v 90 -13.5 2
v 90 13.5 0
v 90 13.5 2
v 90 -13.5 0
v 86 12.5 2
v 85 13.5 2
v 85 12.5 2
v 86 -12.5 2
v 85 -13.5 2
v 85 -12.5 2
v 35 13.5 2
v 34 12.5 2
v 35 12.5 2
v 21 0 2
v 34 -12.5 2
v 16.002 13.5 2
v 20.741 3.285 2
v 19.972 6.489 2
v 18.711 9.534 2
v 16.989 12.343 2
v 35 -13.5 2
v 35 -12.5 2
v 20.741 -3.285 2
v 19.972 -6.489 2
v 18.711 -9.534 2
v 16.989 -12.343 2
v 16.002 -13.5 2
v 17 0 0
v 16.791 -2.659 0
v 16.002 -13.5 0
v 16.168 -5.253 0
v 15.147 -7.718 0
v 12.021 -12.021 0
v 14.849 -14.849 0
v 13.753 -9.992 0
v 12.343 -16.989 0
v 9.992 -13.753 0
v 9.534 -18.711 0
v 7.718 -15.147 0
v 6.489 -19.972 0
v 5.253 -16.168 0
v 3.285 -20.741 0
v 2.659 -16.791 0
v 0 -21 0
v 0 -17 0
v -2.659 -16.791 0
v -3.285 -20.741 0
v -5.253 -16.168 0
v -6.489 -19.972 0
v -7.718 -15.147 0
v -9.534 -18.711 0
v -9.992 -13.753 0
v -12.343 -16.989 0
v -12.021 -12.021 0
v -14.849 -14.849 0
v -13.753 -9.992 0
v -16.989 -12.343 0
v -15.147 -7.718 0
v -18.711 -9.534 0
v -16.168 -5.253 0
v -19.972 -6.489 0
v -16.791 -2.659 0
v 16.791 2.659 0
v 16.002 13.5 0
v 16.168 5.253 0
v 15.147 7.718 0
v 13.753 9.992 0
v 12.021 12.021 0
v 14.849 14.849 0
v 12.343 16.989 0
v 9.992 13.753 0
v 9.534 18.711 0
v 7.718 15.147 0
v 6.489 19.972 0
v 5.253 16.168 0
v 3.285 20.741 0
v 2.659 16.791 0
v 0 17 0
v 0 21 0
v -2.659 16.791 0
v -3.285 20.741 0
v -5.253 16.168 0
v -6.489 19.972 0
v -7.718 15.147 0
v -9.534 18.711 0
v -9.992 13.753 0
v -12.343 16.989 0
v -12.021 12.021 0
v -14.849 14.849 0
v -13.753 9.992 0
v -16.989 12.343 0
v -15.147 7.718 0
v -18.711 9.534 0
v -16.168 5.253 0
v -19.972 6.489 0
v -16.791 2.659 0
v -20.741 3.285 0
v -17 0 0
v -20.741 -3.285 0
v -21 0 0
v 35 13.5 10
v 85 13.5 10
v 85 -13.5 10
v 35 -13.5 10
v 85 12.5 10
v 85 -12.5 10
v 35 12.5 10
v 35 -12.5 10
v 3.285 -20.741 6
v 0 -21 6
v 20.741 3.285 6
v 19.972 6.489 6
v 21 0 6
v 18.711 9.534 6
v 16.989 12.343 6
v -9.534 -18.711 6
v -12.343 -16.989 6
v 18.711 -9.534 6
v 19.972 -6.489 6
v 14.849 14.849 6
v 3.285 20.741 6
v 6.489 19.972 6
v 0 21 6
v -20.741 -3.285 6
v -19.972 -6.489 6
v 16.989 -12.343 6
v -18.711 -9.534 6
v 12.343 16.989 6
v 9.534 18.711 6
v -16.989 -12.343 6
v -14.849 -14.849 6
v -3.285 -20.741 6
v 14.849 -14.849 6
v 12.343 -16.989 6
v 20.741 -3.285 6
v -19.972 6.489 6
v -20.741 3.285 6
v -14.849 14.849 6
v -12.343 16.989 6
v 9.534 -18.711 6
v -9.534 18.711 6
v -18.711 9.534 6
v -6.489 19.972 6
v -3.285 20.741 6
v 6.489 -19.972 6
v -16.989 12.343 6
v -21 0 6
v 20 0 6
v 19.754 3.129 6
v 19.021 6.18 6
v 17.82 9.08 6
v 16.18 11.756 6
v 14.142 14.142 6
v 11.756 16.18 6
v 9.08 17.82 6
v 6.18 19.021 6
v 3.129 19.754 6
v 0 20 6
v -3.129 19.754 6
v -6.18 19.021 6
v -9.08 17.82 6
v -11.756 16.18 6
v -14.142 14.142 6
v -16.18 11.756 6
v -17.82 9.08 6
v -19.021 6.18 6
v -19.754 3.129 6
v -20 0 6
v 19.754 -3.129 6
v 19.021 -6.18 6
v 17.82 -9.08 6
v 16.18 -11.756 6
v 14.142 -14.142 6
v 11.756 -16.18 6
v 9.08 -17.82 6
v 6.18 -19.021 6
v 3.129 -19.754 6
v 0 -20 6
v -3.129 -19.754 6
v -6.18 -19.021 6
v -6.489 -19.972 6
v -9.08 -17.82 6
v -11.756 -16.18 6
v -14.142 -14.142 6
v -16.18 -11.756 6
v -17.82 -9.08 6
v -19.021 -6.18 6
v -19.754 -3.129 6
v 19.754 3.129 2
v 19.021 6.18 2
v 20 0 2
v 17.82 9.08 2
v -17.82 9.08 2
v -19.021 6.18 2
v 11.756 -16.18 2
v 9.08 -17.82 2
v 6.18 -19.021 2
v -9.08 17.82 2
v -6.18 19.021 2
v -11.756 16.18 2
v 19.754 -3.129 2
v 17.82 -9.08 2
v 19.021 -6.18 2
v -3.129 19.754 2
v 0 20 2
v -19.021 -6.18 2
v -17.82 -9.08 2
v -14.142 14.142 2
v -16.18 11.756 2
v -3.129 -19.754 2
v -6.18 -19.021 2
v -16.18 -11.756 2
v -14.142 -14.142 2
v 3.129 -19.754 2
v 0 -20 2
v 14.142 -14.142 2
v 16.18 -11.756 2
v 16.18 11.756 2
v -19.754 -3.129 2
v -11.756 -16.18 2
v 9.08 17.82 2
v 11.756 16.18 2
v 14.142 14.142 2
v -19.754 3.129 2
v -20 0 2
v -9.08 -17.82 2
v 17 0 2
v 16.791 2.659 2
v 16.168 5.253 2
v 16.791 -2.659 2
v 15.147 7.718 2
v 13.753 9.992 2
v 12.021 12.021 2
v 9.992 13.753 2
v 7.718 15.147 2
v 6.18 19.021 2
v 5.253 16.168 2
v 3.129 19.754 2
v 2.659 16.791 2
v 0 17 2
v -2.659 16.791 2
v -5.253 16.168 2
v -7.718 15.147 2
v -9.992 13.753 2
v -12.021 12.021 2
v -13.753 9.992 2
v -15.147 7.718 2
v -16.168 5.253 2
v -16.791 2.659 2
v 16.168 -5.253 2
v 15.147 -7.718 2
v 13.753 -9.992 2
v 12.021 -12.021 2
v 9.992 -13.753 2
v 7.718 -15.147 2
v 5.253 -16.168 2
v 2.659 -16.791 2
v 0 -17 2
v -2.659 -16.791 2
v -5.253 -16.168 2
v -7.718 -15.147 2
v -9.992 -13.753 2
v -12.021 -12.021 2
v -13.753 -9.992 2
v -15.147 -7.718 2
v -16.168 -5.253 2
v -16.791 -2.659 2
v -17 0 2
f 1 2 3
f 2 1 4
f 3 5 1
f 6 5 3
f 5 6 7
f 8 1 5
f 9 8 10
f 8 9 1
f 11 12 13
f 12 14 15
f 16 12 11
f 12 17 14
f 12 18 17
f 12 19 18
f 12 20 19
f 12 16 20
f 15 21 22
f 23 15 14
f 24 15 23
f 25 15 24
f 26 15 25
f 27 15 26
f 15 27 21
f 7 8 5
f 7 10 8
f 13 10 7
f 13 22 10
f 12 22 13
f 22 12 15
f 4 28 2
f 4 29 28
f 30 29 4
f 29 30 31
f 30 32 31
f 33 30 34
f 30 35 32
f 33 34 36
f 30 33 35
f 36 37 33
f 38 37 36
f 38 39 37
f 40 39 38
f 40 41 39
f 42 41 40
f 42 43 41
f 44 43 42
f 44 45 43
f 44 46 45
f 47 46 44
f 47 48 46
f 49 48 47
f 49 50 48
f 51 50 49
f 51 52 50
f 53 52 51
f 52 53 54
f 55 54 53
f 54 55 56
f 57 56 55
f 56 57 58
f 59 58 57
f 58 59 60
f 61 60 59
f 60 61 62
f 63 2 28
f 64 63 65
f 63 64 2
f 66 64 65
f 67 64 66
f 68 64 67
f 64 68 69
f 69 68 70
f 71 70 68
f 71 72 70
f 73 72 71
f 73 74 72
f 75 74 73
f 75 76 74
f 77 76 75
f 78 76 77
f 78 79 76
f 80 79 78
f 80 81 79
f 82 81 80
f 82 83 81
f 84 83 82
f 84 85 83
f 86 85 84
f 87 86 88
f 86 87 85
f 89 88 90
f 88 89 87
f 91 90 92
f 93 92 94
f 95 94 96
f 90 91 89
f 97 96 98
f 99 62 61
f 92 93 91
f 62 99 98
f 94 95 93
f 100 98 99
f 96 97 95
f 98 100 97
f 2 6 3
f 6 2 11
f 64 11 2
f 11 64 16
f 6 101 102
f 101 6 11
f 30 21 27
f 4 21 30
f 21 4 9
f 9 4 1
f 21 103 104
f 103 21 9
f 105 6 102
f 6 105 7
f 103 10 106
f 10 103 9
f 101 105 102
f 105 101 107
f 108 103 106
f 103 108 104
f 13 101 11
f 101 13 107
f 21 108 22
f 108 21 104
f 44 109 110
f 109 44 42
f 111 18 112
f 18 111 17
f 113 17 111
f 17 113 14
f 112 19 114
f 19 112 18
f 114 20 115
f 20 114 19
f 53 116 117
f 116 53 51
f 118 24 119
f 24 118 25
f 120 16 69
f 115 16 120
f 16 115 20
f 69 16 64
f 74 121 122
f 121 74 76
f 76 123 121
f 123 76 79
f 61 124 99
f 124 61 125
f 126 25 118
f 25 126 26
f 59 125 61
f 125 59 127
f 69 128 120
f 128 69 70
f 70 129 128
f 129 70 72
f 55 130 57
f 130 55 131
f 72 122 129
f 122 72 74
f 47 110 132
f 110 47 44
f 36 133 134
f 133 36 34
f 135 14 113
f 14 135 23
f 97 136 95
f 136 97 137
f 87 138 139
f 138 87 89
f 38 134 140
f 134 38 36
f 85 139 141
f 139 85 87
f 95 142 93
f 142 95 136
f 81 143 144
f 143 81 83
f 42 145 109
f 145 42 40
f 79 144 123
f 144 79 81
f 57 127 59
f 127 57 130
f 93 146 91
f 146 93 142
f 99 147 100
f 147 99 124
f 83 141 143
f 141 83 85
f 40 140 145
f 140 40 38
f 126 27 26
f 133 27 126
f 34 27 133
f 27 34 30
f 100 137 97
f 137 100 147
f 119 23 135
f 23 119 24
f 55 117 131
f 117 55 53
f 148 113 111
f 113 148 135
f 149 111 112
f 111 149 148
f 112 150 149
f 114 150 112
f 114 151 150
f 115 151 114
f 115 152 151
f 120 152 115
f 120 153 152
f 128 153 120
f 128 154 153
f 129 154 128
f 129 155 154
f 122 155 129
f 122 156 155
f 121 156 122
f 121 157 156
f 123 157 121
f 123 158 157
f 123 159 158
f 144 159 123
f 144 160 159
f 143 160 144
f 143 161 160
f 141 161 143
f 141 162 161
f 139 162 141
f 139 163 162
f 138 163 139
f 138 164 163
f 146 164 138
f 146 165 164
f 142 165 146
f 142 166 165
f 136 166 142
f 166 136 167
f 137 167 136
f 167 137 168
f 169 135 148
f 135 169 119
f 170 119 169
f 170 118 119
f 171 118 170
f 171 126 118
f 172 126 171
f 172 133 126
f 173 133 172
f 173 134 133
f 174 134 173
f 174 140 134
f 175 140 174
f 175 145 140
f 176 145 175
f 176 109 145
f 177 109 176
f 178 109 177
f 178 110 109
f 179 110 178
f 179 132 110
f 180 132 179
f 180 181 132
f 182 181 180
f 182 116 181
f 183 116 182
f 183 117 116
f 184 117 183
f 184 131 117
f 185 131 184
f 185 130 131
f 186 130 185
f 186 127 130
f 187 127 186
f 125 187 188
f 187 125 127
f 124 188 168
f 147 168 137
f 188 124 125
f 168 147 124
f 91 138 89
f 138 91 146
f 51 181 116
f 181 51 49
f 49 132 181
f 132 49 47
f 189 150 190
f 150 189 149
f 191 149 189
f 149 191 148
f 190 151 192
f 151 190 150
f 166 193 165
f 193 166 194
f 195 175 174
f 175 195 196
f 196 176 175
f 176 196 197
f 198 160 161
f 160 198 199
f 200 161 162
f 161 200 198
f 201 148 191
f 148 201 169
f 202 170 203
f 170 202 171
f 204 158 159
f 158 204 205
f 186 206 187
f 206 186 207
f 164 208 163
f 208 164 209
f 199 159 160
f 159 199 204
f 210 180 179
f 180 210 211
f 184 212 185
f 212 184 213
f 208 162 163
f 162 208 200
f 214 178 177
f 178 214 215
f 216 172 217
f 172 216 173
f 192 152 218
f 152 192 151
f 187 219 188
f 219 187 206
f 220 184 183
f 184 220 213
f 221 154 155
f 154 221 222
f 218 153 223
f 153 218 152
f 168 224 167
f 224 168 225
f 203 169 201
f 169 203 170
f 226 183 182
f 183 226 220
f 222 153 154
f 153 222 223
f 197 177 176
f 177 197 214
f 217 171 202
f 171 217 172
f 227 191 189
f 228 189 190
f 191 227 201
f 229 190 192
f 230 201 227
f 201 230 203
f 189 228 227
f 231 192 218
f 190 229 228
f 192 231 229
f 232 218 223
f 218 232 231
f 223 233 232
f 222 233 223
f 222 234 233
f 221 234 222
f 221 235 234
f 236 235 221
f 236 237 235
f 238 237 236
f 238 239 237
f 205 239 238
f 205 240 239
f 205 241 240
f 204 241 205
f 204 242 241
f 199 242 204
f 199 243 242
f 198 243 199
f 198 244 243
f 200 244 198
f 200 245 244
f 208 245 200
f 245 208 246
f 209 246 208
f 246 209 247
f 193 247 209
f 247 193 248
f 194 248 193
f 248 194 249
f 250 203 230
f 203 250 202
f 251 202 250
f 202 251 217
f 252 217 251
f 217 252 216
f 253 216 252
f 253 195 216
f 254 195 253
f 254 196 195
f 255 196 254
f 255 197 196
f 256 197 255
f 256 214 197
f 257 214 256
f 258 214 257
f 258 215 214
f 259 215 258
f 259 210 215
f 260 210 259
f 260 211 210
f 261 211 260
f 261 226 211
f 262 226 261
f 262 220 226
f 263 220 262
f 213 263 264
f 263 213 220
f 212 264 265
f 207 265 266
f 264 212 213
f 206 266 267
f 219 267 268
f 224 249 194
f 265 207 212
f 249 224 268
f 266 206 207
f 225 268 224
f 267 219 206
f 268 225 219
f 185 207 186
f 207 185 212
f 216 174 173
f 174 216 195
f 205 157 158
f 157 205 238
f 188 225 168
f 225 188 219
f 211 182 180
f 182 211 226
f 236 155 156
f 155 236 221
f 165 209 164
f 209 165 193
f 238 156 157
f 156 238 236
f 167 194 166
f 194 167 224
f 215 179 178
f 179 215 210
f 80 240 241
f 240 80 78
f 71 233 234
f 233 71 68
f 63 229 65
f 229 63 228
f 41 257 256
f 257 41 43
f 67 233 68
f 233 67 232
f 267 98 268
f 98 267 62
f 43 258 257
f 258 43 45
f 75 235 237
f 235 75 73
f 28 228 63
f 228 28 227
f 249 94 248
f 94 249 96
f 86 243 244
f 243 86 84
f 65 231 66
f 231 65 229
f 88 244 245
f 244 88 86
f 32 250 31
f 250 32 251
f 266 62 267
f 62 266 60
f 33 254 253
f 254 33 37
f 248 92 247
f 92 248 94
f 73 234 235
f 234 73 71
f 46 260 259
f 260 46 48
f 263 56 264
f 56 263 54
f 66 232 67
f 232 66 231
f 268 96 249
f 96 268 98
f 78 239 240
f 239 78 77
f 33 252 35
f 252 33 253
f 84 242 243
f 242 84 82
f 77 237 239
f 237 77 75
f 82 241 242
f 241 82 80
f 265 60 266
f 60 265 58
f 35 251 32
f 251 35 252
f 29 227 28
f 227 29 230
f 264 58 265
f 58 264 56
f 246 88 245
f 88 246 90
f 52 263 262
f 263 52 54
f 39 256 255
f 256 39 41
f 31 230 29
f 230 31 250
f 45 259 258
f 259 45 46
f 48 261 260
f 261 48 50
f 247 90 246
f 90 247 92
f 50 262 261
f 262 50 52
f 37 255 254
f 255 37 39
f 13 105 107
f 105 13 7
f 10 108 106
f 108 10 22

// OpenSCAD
//MR WHOOSH FLAMETHROWER MKII
//DO NOT EVER MAKE ONE OF THESE
//HIGH RISK OF FIRE AND BURNS
//adjust these two variables to suit
//leave the "=" and ";" intact
width = 25;  //width of squirter base
dia = 40;  //diameter of tealight cup

//don't modify anything below
$fn = 40;
block = width + 2;

difference() {
    union() {
        // Base for spray unit.
        translate([0, -13.5, 0])
            cube([90, 27, 2]);
        
        // Block for mounting wings.
        translate([35, -(block / 2), 0])
            cube([50, block, 10]);
        
        // Tea light base.
        translate([0, 0, 0])  
            cylinder(h = 6, d1 = dia + 2, d2 = dia + 2);
    }
    
    // Tea light insert.
    translate([0, 0, 2])
        cylinder(h = 5,d1 = dia,d2 = dia);
    
    // Base thermal isolation hole.
    translate([0, 0, -1])
        cylinder(h = 4, d1 = dia - 6, d2 = dia - 6);
    
    // Sprayer base wings.
    translate([34, -(width / 2), 2])
        cube([52, width, 10]);
}
